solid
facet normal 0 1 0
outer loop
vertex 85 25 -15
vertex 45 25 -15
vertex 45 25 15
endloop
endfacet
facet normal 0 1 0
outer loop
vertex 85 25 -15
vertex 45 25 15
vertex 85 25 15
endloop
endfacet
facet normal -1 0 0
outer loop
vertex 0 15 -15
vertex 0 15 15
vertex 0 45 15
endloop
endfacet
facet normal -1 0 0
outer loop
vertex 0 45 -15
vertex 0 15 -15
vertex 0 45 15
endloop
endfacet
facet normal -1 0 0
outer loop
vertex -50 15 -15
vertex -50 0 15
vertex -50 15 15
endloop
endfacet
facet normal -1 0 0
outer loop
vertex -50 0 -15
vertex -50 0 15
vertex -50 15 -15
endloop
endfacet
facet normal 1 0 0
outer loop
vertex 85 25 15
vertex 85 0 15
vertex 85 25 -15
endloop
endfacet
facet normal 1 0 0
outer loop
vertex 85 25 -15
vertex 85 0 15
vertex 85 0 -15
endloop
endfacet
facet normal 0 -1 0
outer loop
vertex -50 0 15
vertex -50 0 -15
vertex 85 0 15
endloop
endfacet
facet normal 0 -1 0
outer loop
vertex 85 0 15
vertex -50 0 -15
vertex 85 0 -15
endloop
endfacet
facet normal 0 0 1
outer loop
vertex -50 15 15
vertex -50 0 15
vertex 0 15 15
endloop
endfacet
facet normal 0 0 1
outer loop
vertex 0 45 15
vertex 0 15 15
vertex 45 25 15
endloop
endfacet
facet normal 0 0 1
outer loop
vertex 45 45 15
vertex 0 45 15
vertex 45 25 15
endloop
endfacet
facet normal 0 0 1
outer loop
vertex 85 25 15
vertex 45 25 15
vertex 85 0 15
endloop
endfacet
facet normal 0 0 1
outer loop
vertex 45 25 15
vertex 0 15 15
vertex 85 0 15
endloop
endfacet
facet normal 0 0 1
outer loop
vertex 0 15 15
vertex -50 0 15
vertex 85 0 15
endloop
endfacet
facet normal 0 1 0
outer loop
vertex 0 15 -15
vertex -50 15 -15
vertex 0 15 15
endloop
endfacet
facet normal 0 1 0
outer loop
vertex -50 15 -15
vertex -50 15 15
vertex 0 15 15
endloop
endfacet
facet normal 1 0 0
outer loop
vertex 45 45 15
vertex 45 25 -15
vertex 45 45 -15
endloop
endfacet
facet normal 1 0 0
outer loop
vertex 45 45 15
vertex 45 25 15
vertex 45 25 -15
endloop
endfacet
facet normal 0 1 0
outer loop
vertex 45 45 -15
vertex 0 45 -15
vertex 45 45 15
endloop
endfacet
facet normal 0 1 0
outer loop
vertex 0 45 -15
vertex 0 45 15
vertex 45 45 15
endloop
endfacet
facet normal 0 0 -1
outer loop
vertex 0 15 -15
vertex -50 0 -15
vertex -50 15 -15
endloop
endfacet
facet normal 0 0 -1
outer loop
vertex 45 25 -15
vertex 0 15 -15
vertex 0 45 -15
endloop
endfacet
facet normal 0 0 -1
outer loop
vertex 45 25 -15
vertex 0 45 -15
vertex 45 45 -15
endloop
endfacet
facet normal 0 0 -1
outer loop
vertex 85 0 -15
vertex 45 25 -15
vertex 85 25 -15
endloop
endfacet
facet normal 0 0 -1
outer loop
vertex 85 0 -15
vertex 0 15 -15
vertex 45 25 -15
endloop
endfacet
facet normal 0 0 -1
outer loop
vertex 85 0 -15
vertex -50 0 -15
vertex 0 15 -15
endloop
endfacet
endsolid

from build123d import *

# Parameters (mm, degrees)
SCHIZZO1_W                   = 50
SCHIZZO1_H                   = 30
ESTRUSIONE_ESTRUSIONE1_DEPTH = 15
SCHIZZO3_W                   = 45
SCHIZZO3_H                   = 15
ESTRUSIONE_ESTRUSIONE2_DEPTH = 15
SCHIZZO4_W                   = 45
SCHIZZO4_H                   = 30
ESTRUSIONE_ESTRUSIONE3_DEPTH = 15
SCHIZZO5_W                   = 40
SCHIZZO5_H                   = 30
ESTRUSIONE_ESTRUSIONE4_DEPTH = 25


with BuildPart() as part:
    # Schizzo1 → Estrusione-Estrusione1 (new body)
    with BuildSketch(Plane(origin=(0, 0, 0), x_dir=(1, 0, 0), z_dir=(0, 1, 0))):
        with Locations((-25, 0)):
            Rectangle(SCHIZZO1_W, SCHIZZO1_H)
    extrude(amount=ESTRUSIONE_ESTRUSIONE1_DEPTH)

    # Schizzo3 → Estrusione-Estrusione2 (add, symmetric)
    with BuildSketch(Plane.XY):
        with Locations((22.5, 7.5)):
            Rectangle(SCHIZZO3_W, SCHIZZO3_H)
    extrude(amount=ESTRUSIONE_ESTRUSIONE2_DEPTH, both=True)

    # Schizzo4 → Estrusione-Estrusione3 (add, symmetric)
    with BuildSketch(Plane.XY):
        with Locations((22.5, 30)):
            Rectangle(SCHIZZO4_W, SCHIZZO4_H)
    extrude(amount=ESTRUSIONE_ESTRUSIONE3_DEPTH, both=True)

    # Schizzo5 → Estrusione-Estrusione4 (add)
    with BuildSketch(Plane(origin=(0, 0, 0), x_dir=(1, 0, 0), z_dir=(0, 1, 0))):
        with Locations((65, 0)):
            Rectangle(SCHIZZO5_W, SCHIZZO5_H)
    extrude(amount=ESTRUSIONE_ESTRUSIONE4_DEPTH)


solid = part.part
